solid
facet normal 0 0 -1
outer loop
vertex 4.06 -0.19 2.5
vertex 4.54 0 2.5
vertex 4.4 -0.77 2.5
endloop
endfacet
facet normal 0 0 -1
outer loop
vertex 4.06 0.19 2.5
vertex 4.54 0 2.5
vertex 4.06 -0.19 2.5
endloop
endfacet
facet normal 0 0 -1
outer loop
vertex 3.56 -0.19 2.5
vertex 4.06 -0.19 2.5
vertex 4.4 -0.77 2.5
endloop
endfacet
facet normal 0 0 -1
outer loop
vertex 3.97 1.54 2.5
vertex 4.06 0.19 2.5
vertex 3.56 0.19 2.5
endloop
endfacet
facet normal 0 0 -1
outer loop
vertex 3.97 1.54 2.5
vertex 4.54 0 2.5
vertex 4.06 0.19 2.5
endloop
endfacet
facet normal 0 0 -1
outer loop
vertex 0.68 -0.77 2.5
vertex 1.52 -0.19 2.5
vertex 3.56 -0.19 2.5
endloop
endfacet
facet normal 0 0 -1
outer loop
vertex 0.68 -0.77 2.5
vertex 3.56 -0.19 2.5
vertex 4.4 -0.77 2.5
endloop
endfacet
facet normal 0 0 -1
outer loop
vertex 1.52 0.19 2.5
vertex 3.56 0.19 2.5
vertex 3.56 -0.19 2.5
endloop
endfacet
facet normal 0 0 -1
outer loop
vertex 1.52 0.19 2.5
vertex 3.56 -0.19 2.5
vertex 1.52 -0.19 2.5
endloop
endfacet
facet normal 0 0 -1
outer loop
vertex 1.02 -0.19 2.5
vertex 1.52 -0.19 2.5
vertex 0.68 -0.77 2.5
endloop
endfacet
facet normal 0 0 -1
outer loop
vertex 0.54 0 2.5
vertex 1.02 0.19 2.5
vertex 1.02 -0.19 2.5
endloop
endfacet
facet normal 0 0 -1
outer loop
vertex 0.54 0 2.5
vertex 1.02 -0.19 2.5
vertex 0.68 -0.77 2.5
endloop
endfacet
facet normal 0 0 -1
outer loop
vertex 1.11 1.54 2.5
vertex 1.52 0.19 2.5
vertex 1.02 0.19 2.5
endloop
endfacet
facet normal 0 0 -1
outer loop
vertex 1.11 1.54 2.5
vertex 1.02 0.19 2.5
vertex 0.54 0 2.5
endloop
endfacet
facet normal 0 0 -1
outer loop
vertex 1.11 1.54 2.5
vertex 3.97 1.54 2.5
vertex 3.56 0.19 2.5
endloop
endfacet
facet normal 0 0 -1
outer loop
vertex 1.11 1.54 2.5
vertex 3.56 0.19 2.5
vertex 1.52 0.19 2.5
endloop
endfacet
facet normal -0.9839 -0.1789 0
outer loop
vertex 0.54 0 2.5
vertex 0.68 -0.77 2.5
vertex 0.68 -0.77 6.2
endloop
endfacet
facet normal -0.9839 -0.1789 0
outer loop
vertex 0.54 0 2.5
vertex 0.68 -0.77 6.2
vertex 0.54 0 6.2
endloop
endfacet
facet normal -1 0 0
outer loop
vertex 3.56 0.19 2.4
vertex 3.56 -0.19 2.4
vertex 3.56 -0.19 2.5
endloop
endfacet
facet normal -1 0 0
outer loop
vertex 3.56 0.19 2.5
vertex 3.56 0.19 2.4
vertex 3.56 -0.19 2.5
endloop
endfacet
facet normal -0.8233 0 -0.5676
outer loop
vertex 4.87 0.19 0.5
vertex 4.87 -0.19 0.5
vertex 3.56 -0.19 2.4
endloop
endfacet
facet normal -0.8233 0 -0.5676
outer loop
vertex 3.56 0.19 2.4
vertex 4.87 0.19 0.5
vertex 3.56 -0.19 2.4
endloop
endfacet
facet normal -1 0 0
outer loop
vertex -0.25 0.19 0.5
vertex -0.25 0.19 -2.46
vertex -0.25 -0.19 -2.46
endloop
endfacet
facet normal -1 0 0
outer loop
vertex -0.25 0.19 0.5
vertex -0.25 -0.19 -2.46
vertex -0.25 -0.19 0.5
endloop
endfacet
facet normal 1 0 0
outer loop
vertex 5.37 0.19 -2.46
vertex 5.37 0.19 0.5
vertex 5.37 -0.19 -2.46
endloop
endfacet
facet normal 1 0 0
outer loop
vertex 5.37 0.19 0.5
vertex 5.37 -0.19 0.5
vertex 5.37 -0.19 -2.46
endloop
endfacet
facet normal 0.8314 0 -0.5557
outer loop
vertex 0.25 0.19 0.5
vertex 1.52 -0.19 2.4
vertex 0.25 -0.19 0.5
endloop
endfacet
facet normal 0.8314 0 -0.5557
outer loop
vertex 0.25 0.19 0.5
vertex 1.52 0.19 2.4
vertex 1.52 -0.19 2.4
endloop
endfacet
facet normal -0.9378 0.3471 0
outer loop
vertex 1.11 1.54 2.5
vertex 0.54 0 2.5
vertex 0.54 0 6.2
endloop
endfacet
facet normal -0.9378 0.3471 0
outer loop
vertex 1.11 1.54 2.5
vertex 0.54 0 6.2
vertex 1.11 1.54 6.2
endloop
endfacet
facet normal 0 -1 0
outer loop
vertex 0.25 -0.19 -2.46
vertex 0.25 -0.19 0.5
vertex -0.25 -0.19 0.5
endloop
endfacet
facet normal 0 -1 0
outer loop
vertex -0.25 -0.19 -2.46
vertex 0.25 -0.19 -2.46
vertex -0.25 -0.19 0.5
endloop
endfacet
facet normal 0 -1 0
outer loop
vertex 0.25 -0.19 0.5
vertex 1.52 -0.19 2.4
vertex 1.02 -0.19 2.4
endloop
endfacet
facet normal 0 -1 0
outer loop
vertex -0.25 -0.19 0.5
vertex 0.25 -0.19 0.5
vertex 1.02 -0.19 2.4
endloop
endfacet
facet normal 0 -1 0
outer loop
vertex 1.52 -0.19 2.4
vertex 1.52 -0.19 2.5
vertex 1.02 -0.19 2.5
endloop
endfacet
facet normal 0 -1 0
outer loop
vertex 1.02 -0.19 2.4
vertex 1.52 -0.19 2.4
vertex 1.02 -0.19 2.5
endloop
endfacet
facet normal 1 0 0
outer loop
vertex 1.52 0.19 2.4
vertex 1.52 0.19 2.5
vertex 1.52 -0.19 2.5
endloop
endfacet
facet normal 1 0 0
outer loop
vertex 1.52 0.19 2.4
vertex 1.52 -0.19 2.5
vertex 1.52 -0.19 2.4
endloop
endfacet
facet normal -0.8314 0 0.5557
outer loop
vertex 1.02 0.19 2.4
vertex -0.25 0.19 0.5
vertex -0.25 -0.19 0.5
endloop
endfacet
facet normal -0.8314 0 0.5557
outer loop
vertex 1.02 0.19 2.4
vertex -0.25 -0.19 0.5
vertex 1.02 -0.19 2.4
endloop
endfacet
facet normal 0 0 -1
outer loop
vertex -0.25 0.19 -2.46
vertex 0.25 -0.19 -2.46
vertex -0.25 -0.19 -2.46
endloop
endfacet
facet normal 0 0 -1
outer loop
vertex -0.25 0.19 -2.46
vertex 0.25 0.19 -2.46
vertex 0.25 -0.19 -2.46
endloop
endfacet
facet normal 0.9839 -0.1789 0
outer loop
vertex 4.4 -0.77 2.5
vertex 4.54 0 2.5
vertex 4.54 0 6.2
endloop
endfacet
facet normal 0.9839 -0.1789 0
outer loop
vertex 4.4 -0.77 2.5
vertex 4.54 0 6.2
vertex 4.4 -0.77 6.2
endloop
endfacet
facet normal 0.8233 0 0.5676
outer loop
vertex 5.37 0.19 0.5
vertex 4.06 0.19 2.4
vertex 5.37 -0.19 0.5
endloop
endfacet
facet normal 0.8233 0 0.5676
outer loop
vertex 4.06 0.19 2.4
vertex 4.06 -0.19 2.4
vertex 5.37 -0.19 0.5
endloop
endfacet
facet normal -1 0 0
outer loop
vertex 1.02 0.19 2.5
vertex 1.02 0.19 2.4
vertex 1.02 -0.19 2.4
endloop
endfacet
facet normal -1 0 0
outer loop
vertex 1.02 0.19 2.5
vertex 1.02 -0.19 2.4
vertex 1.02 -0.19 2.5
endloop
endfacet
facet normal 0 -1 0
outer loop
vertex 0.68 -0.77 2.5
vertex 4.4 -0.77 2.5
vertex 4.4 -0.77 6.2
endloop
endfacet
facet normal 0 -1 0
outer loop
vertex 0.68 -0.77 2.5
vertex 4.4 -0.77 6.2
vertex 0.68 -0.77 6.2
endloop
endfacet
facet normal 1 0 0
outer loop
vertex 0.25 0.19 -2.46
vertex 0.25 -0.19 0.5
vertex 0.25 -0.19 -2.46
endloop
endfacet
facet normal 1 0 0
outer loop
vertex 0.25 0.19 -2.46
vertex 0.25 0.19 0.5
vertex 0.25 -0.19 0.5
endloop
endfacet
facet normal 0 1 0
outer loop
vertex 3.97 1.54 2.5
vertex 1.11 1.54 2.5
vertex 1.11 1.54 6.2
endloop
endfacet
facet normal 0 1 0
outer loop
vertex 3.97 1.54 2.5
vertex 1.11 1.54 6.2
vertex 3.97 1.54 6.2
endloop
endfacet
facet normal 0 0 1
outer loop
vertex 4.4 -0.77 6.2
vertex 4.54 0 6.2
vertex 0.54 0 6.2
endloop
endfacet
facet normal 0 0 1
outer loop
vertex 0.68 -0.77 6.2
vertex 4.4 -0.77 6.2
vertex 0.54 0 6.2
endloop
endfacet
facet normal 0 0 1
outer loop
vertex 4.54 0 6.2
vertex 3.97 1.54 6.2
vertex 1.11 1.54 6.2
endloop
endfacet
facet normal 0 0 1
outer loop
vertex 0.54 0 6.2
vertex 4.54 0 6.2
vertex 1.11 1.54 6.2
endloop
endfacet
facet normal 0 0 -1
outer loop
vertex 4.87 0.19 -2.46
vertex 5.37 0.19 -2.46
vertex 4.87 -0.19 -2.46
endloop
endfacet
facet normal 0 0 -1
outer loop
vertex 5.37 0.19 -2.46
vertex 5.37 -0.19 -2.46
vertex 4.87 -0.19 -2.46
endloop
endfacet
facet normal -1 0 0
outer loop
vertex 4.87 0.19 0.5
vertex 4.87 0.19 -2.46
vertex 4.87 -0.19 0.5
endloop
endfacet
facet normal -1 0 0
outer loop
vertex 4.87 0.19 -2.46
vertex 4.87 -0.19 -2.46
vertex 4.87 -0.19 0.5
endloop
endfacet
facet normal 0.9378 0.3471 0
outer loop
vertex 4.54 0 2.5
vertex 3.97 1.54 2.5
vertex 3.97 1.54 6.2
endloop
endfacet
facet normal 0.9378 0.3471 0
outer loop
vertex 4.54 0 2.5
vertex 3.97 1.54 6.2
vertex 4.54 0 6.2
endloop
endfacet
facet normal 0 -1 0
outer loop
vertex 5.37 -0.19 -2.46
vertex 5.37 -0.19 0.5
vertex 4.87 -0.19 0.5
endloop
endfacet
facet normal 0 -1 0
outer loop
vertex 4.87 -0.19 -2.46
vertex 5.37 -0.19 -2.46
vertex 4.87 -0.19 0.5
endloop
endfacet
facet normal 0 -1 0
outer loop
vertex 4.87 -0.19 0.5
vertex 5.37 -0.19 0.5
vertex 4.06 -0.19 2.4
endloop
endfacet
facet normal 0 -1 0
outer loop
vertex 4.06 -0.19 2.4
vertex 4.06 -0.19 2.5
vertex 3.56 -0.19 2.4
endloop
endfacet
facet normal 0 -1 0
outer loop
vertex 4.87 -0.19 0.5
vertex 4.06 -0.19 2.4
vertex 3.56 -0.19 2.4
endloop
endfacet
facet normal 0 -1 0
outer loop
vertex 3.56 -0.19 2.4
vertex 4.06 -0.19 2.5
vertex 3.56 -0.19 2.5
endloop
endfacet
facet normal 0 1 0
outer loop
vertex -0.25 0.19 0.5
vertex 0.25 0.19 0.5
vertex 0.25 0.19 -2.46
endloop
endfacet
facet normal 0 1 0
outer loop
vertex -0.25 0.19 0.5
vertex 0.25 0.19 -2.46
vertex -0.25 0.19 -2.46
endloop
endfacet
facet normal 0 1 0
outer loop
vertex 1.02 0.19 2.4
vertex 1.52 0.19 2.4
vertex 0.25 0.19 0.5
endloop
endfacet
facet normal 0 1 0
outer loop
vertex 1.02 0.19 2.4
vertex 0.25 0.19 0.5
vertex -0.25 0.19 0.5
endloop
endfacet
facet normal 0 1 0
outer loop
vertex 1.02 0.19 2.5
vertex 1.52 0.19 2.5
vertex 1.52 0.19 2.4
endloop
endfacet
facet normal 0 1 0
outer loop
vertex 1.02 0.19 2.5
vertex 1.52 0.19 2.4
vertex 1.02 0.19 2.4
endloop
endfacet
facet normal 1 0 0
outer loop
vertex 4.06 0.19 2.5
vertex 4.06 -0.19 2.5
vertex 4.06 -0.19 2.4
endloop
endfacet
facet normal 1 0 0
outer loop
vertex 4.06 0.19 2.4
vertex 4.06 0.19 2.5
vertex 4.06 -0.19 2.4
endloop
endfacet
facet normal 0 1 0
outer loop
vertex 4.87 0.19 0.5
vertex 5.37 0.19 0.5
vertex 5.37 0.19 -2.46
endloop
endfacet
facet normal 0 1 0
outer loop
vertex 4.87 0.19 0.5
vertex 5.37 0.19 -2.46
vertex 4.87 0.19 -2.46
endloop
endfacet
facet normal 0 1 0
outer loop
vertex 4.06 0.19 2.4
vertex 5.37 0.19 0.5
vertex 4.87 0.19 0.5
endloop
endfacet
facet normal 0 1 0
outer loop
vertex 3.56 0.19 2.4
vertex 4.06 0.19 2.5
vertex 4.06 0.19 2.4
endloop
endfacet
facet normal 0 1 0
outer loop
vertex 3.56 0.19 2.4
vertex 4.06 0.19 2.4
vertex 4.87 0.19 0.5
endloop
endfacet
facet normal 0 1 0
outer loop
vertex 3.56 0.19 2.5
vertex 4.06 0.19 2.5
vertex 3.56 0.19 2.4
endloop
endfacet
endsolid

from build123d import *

# Parameters (mm, degrees)
PAD_DEPTH    = 3.7
PAD001_DEPTH = 0.19


with BuildPart() as pad:
    # Sketch → Pad (new body)
    with BuildSketch(Plane.XY.offset(2.5)):
        Polygon((1.11, 1.54), (3.97, 1.54), (4.54, 0), (4.4, -0.77), (0.68, -0.77), (0.54, 0), align=None)
    extrude(amount=PAD_DEPTH)


with BuildPart() as to_92s_2_wide:
    # Sketch001 → Pad001 (new body, symmetric)
    with BuildSketch(Plane.XZ):
        Polygon((0.25, -2.46), (-0.25, -2.46), (-0.25, 0.5), (1.02, 2.4), (1.02, 3.04), (1.52, 3.04), (1.52, 2.4), (0.25, 0.5), align=None)
        Polygon((3.56, 3.04), (4.06, 3.04), (4.06, 2.4), (5.37, 0.5), (5.37, -2.46), (4.87, -2.46), (4.87, 0.5), (3.56, 2.4), align=None)
    extrude(amount=PAD001_DEPTH, both=True)

    # Pad001_mp_cp: union Pad
    add(pad.part)


solid = to_92s_2_wide.part
